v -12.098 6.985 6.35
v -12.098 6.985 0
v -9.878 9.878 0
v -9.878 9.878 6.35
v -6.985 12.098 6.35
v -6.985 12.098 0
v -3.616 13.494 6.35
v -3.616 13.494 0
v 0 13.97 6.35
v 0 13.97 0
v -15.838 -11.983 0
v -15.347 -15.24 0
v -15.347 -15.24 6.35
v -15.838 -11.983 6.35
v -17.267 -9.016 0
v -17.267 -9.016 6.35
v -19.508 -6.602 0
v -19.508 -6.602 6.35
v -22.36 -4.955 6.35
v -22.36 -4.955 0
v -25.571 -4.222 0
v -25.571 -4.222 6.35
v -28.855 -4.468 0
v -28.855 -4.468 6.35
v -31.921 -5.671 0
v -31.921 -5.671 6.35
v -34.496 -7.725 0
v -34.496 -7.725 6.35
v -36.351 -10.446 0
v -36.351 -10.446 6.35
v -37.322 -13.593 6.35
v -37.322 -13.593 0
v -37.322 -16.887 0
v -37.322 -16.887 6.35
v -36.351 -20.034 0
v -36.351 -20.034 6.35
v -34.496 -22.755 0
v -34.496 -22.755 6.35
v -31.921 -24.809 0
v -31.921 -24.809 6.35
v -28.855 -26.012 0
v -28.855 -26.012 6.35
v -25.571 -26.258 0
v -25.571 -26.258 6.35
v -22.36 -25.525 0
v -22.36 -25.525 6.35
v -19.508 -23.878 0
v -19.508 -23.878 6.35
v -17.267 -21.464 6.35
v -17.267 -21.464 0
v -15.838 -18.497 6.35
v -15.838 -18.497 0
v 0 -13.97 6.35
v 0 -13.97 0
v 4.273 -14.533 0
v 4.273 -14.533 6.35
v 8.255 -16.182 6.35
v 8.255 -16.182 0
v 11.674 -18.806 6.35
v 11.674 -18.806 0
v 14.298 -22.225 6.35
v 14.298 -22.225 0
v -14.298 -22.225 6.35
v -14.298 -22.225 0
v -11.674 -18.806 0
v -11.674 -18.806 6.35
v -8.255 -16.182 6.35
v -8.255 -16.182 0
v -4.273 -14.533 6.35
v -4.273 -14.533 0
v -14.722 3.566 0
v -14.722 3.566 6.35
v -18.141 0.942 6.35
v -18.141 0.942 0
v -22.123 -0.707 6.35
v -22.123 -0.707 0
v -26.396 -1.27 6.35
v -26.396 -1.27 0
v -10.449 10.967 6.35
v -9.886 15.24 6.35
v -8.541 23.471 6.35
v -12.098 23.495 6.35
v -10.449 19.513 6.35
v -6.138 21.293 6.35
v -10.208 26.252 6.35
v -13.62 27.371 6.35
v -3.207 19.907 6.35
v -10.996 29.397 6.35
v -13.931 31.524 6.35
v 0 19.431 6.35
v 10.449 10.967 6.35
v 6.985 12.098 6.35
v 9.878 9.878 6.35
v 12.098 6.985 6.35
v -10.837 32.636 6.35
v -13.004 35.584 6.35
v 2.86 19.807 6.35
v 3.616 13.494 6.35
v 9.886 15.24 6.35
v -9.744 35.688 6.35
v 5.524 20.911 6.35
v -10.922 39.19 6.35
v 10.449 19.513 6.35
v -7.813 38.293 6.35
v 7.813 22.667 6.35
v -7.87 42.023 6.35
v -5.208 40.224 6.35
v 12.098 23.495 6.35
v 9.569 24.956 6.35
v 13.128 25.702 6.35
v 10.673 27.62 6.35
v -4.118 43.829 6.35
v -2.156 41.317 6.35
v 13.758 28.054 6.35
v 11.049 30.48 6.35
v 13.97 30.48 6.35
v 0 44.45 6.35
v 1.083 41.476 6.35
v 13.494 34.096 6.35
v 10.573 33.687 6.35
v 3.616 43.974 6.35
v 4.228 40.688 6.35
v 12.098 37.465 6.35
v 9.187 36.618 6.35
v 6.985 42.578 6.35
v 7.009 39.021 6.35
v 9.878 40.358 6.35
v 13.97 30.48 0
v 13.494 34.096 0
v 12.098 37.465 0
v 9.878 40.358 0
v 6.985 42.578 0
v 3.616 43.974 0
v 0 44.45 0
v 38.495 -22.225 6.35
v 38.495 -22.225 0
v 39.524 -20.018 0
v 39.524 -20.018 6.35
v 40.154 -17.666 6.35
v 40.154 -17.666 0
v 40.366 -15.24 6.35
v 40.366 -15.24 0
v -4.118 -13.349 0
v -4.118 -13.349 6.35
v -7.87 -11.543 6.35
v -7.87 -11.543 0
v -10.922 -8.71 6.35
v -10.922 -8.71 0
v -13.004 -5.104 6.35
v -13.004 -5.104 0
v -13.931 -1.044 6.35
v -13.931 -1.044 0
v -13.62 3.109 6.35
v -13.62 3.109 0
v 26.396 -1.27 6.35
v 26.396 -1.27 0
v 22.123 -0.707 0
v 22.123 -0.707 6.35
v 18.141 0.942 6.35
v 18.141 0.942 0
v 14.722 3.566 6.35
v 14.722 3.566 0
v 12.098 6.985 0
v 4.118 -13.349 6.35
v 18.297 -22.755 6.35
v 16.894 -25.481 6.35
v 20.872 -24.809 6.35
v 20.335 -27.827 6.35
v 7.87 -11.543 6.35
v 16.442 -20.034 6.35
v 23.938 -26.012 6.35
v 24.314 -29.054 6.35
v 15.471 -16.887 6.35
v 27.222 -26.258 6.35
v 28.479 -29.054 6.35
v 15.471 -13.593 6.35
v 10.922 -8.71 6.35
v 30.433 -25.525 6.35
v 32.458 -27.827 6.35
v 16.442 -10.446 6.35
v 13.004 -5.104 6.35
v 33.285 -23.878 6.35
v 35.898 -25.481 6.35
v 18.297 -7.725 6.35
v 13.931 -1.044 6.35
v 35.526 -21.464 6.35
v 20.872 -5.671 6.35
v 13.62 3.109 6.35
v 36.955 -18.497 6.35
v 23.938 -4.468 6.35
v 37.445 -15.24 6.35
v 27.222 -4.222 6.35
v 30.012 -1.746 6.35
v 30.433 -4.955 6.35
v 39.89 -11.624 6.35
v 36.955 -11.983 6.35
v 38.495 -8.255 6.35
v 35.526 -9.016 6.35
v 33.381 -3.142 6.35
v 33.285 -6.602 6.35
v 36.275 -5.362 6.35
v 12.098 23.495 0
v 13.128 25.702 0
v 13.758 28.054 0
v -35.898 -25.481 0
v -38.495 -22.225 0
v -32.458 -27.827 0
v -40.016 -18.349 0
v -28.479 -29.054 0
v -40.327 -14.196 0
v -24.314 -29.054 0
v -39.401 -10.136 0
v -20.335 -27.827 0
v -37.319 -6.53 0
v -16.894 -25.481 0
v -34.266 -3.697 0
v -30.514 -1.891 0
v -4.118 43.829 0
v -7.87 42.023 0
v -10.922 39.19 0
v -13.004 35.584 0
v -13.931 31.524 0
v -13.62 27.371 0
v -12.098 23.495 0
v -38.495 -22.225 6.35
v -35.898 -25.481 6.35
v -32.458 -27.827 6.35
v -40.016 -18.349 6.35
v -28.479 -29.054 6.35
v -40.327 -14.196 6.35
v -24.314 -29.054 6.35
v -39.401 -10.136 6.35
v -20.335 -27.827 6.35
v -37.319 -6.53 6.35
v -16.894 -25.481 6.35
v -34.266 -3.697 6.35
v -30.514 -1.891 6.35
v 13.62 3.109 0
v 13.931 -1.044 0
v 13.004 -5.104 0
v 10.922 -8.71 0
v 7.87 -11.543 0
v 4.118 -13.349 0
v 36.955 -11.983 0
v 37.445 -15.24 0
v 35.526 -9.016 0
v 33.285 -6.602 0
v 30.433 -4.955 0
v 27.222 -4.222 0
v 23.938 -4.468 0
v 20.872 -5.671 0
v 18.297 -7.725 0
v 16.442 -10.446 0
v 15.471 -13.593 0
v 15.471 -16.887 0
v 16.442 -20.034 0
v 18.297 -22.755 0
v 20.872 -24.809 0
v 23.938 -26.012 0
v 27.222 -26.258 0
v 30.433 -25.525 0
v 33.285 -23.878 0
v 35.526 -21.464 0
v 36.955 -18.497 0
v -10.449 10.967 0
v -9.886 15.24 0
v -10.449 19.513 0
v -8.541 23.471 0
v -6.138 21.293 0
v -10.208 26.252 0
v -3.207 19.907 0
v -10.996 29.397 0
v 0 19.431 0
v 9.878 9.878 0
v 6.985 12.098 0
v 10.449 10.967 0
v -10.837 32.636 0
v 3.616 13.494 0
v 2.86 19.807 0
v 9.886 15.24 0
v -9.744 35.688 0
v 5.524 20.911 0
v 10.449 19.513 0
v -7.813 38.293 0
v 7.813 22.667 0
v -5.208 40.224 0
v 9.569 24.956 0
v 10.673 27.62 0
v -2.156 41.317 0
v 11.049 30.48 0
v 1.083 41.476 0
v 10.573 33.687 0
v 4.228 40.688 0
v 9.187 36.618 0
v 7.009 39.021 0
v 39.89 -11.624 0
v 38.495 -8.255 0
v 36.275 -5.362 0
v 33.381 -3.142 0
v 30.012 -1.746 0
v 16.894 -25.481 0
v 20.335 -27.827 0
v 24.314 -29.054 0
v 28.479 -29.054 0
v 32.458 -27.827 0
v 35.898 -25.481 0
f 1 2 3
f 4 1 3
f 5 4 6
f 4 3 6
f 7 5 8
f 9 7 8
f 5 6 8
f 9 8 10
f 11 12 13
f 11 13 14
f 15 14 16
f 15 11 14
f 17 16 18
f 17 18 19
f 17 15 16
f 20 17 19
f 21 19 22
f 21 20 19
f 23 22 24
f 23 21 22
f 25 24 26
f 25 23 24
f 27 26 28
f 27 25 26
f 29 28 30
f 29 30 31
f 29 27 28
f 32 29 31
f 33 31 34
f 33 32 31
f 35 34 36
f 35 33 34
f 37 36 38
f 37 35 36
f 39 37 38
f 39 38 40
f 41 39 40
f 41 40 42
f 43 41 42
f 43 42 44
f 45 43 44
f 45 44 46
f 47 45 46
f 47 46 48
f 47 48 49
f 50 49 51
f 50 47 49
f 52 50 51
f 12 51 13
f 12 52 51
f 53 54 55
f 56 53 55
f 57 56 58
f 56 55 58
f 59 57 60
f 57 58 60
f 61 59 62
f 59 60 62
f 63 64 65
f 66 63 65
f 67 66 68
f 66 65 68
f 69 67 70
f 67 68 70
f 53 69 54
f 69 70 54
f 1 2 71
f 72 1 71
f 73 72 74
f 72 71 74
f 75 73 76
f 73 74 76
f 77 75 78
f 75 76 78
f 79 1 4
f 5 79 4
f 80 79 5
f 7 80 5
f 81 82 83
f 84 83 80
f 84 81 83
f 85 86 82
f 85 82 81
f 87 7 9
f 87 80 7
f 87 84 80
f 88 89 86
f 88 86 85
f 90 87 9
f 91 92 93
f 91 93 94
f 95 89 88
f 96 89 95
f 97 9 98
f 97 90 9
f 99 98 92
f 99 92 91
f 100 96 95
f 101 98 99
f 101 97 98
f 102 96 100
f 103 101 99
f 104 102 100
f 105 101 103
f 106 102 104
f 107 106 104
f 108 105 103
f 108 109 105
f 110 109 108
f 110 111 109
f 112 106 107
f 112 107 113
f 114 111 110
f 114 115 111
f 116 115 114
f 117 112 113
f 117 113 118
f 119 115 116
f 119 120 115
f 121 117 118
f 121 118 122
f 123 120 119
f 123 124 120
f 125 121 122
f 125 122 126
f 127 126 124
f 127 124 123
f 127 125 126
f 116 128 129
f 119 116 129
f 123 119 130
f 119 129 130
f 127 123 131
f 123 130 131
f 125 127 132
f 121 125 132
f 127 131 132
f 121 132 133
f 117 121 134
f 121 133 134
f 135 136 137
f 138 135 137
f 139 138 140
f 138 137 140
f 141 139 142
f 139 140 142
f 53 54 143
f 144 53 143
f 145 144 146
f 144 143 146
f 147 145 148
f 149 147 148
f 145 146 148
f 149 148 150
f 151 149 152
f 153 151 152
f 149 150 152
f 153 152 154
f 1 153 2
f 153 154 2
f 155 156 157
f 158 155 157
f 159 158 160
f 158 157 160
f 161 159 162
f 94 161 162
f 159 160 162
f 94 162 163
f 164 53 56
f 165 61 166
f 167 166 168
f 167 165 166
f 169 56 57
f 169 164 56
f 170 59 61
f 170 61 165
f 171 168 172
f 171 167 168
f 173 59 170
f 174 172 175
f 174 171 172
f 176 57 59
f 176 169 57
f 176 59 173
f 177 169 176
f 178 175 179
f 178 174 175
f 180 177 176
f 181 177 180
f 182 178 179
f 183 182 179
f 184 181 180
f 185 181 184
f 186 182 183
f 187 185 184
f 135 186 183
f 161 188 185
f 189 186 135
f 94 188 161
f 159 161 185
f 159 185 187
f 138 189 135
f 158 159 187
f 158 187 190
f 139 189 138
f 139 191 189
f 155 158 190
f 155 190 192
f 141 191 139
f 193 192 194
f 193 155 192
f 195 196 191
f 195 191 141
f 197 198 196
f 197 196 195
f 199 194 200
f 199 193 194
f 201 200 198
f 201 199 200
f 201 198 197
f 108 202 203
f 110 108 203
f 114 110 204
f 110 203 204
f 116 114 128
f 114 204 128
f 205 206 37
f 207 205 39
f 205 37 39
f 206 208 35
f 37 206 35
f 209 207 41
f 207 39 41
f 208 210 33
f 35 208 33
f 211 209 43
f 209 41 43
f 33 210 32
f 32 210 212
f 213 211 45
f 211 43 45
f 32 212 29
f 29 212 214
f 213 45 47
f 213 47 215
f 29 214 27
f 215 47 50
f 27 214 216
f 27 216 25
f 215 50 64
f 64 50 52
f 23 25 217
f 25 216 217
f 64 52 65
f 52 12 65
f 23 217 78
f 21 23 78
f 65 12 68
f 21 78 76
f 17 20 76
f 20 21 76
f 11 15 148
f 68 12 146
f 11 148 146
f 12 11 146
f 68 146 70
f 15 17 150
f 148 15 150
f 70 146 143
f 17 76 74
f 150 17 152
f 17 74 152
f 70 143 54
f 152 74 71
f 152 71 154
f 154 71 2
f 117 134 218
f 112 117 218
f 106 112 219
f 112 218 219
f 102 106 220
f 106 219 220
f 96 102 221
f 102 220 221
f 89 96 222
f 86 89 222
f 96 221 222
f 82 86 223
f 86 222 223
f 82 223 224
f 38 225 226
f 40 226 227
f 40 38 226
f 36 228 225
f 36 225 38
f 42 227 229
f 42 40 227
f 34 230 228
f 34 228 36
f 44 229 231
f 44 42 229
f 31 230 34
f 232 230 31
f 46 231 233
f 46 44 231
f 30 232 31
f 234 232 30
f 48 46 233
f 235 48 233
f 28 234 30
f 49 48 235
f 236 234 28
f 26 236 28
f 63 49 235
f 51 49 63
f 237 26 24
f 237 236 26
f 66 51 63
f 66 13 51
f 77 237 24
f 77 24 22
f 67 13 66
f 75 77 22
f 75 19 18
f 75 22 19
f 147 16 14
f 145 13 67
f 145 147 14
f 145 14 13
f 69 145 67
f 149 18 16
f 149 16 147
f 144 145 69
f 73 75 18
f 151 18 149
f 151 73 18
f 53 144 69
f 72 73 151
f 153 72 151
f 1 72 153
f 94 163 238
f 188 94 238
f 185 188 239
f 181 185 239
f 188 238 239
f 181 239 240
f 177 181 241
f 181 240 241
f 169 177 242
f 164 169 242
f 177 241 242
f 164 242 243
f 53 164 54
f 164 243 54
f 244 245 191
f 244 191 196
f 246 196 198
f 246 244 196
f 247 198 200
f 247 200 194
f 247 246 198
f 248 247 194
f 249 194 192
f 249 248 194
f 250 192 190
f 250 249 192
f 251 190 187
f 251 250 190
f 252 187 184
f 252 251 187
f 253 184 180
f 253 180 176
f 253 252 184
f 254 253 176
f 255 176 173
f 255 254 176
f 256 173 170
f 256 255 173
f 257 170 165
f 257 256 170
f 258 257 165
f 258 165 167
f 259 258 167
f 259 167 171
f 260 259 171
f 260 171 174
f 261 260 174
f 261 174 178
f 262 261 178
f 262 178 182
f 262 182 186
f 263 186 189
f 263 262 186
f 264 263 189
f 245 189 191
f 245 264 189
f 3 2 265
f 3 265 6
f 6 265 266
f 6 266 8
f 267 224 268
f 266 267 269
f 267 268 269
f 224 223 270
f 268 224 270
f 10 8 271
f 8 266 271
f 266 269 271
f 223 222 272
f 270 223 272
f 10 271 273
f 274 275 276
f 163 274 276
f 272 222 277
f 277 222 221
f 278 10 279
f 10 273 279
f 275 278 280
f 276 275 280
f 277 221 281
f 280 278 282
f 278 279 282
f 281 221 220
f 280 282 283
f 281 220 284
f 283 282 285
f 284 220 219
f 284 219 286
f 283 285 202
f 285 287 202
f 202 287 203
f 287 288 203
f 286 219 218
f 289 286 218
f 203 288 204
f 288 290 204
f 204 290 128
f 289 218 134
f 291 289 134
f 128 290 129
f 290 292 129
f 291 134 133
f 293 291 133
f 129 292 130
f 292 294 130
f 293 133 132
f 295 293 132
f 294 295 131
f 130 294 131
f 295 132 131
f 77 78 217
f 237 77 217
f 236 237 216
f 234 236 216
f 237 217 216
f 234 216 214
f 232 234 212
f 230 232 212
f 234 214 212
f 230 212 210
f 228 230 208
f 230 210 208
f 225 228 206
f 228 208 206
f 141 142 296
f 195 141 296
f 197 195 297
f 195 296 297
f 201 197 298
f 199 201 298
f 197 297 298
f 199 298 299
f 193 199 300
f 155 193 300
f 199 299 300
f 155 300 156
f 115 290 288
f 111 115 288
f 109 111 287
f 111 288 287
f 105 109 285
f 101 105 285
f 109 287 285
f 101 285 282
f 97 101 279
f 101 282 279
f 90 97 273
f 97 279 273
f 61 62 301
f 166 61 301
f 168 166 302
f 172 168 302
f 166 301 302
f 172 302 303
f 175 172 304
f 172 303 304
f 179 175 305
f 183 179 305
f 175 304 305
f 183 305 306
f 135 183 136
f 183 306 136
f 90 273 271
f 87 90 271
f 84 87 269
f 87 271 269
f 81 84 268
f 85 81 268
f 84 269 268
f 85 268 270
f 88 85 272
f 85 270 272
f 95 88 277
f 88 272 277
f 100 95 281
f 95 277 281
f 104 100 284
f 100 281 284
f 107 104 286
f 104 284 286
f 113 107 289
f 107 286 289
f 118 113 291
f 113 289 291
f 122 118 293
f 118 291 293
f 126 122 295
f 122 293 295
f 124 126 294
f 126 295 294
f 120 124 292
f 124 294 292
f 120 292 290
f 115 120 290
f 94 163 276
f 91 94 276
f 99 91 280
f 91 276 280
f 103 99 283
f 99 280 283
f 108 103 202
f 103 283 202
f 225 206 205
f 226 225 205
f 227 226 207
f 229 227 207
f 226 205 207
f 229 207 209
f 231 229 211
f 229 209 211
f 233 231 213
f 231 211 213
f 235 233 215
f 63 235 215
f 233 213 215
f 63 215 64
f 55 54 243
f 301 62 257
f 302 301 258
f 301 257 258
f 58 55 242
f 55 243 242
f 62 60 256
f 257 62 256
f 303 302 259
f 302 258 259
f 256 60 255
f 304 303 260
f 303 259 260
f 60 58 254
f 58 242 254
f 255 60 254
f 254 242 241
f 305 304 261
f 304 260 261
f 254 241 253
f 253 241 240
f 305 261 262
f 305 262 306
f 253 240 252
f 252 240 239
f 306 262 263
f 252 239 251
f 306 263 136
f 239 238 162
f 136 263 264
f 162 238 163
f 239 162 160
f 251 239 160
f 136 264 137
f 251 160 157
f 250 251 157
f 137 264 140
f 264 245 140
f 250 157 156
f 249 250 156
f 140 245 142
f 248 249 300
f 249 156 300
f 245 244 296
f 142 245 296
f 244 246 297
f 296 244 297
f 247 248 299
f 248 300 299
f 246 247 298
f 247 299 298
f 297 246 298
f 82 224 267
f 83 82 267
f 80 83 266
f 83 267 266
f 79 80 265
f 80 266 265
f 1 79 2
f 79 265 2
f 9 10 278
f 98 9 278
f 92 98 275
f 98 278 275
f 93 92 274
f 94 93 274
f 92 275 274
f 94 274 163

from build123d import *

# Parameters (mm, degrees)
F0_R     = 11.049
F1_DEPTH = 6.35


with BuildPart() as f1:
    # F0 (on Top) → F1 (new body)
    with BuildSketch(Plane.XY):
        with BuildLine():
            ThreePointArc((-26.3964543073, -1.27), (-38.4948290673, -8.2549997732), (-38.4948294602, -22.2249995463))
            ThreePointArc((-38.4948294602, -22.2249995463), (-26.3964545693, -29.21), (-14.2980794165, -22.225))
            ThreePointArc((-14.2980794165, -22.225), (-12.9024705141, -18.8557020601), (-12.4264543073, -15.24))
            ThreePointArc((-12.4264543073, -15.24), (-16.5181725742, -5.3617182668), (-26.3964543073, -1.27))
        make_face()
        with Locations((-26.3964543073, -15.24)):
            Circle(F0_R, mode=Mode.SUBTRACT)
        with BuildLine():
            ThreePointArc((-12.0983748951, 6.9849999927), (-18.141454311, 0.9419205814), (-26.3964543073, -1.27))
            ThreePointArc((-26.3964543073, -1.27), (-16.5181725742, -5.3617182668), (-12.4264543073, -15.24))
            ThreePointArc((-12.4264543073, -15.24), (-12.9024705141, -18.8557020601), (-14.2980794165, -22.225))
            ThreePointArc((-14.2980794165, -22.225), (-8.2549999937, -16.1819205799), (1.45e-08, -13.97))
            ThreePointArc((1.45e-08, -13.97), (-12.0983748851, -6.98500001), (-12.0983748951, 6.9849999927))
        make_face()
    extrude(amount=F1_DEPTH)


with BuildPart() as f1b:
    # F0 (on Top) → F1, piece 2 (new body)
    with BuildSketch(Plane.XY):
        with BuildLine():
            ThreePointArc((0, 16.51), (-6.985, 18.3816251091), (-12.0983748909, 23.495))
            ThreePointArc((-12.0983748909, 23.495), (-9.8864543073, 15.2399999958), (-12.0983748951, 6.9849999927))
            ThreePointArc((-12.0983748951, 6.9849999927), (-6.9850000037, 12.0983748888), (0, 13.97))
            Line((0, 13.97), (0, 16.51))
        make_face()
        with BuildLine():
            ThreePointArc((12.0983749373, 6.9849999196), (9.8864543073, 15.2399999536), (12.0983748909, 23.495))
            ThreePointArc((12.0983748909, 23.495), (6.985, 18.3816251091), (0, 16.51))
            Line((0, 16.51), (0, 13.97))
            ThreePointArc((0, 13.97), (6.9850000402, 12.0983748677), (12.0983749373, 6.9849999196))
        make_face()
        with BuildLine():
            ThreePointArc((13.97, 30.48), (9.8782817686, 40.3582816978), (1.001e-07, 44.45))
            ThreePointArc((1.001e-07, 44.45), (-12.0983748658, 37.4650000434), (-12.0983748909, 23.495))
            ThreePointArc((-12.0983748909, 23.495), (-6.985, 18.3816251091), (0, 16.51))
            ThreePointArc((0, 16.51), (6.985, 18.3816251091), (12.0983748909, 23.495))
            ThreePointArc((12.0983748909, 23.495), (13.4939837933, 26.8642979399), (13.97, 30.48))
        make_face()
        with BuildLine():
            ThreePointArc((11.049, 30.48), (7.8128228253, 22.6671771747), (0, 19.431))
            ThreePointArc((0, 19.431), (-7.8128228253, 38.2928228253), (11.049, 30.48))
        make_face(mode=Mode.SUBTRACT)
    extrude(amount=F1_DEPTH)


with BuildPart() as f1c:
    # F0 (on Top) → F1, piece 3 (new body)
    with BuildSketch(Plane.XY):
        with BuildLine():
            ThreePointArc((14.2980794165, -22.225), (26.396454199, -29.21), (38.4948290898, -22.2250001877))
            ThreePointArc((38.4948290898, -22.2250001877), (39.8904380726, -18.8557021648), (40.3664543073, -15.24))
            ThreePointArc((40.3664543073, -15.24), (36.2747360405, -5.3617182668), (26.3964543073, -1.27))
            ThreePointArc((26.3964543073, -1.27), (14.2980794165, -8.255), (14.2980794165, -22.225))
        make_face()
        with Locations((26.3964543073, -15.24)):
            Circle(F0_R, mode=Mode.SUBTRACT)
        with BuildLine():
            ThreePointArc((1.45e-08, -13.97), (8.2550000063, -16.1819205872), (14.2980794165, -22.225))
            ThreePointArc((14.2980794165, -22.225), (14.2980794165, -8.255), (26.3964543073, -1.27))
            ThreePointArc((26.3964543073, -1.27), (18.1414543475, 0.9419205603), (12.0983749373, 6.9849999196))
            ThreePointArc((12.0983749373, 6.9849999196), (13.4939838053, 3.6157020152), (13.97, 0))
            ThreePointArc((13.97, 0), (9.8782817383, -9.878281728), (1.45e-08, -13.97))
        make_face()
    extrude(amount=F1_DEPTH)


solid = Compound([f1.part, f1b.part, f1c.part])
